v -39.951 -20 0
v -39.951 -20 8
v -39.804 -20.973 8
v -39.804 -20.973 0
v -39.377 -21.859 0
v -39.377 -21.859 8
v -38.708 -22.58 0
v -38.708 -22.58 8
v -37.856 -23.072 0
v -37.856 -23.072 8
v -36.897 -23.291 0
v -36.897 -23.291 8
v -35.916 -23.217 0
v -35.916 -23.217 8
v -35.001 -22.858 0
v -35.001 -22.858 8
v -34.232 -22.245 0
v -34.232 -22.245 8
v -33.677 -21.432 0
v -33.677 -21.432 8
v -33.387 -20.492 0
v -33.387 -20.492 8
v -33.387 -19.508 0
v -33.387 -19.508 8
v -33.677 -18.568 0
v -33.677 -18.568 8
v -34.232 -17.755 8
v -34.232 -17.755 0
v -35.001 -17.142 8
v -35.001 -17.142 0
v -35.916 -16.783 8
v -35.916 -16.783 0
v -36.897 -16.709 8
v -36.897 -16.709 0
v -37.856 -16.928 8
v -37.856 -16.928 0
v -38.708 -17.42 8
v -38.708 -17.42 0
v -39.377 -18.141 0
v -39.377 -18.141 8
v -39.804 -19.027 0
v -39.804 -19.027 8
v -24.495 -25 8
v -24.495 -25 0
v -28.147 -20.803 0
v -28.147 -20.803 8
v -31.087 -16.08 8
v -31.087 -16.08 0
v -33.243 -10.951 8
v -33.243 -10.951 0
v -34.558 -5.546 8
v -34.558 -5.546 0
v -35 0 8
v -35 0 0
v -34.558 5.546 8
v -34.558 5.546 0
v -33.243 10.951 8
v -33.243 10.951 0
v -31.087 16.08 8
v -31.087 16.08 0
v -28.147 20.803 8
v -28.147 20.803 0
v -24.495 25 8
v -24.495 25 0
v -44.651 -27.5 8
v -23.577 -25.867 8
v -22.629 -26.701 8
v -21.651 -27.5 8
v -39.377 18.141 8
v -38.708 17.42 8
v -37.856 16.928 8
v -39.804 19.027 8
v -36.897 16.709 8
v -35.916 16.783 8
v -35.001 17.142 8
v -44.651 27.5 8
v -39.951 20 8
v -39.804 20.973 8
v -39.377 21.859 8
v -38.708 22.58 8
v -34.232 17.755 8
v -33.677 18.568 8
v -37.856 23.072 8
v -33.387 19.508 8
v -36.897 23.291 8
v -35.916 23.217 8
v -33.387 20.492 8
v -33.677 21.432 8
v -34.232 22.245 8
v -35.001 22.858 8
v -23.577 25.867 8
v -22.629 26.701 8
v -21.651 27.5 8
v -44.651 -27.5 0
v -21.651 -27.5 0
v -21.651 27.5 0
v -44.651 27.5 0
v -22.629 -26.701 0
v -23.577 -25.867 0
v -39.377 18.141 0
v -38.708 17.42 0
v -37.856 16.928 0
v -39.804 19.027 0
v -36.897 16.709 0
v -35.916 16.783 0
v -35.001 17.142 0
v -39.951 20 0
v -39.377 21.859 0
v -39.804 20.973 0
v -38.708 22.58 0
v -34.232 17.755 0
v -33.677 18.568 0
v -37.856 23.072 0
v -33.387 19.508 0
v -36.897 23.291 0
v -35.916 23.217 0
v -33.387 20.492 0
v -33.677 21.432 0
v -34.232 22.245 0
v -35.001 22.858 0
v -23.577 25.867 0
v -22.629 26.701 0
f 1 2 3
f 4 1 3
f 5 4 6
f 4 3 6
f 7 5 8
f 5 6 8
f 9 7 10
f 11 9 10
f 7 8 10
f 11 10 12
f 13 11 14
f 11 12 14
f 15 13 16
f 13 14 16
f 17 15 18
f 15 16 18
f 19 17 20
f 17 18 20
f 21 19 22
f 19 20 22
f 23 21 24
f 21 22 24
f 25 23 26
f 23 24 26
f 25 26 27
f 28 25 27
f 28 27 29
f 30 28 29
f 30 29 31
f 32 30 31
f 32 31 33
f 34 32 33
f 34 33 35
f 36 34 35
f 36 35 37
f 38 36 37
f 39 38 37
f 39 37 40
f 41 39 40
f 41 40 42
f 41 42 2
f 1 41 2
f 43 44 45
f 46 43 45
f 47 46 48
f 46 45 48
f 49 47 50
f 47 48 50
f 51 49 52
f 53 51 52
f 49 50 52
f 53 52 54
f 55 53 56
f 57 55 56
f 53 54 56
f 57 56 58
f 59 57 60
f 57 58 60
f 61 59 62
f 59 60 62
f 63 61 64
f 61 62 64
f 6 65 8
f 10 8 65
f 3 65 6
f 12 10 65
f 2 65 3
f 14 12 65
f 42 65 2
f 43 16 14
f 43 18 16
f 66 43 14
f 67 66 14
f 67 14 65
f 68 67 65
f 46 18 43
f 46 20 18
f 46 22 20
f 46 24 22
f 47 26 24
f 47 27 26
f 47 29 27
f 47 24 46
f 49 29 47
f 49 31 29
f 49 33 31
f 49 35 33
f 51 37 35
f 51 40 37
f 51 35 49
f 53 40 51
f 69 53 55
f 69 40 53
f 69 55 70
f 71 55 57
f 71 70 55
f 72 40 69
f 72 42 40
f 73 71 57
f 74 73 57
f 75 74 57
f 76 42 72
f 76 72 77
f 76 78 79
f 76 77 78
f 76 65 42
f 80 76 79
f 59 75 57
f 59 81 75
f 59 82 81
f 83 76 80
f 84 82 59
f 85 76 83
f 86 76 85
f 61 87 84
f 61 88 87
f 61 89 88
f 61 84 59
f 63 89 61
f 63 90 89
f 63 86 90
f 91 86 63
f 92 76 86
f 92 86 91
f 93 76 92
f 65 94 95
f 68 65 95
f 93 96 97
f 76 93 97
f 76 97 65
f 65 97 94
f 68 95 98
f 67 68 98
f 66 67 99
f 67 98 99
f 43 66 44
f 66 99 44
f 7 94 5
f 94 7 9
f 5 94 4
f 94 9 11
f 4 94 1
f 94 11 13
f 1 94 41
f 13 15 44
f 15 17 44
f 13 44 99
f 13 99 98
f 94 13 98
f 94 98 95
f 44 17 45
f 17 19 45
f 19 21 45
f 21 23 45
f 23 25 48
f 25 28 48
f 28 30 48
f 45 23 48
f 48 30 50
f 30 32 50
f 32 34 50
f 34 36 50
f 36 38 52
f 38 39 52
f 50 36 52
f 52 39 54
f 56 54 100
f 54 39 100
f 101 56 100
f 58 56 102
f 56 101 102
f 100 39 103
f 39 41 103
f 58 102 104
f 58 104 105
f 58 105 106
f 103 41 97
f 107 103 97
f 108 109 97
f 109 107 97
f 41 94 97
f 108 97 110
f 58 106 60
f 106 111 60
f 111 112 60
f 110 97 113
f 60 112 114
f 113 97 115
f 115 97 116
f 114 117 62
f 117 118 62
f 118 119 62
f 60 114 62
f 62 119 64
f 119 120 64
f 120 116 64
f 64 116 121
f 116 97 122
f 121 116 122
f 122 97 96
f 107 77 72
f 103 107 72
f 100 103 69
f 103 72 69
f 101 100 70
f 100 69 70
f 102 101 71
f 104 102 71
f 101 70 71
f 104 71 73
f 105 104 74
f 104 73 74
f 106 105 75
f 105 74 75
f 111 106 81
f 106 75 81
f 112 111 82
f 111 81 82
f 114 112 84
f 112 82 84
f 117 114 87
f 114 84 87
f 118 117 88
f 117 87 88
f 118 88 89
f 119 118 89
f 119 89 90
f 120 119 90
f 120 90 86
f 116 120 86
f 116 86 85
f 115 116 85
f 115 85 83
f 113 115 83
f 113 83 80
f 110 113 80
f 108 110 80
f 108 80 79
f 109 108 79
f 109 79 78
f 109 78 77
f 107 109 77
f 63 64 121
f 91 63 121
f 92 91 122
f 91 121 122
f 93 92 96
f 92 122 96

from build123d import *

# Parameters (mm, degrees)
F1_DEPTH = 8
F3_D     = 6.6


with BuildPart() as f1:
    # F0 (on Top) → F1 (new body)
    with BuildSketch(Plane.XY):
        with BuildLine():
            ThreePointArc((-24.494897, -25), (-35, 0), (-24.494897, 25))
            ThreePointArc((-24.494897, 25), (-23.106602, 26.288495), (-21.650635, 27.5))
            Line((-21.650635, 27.5), (-44.650635, 27.5))
            Line((-44.650635, 27.5), (-44.650635, -27.5))
            Line((-44.650635, -27.5), (-21.650635, -27.5))
            ThreePointArc((-21.650635, -27.5), (-23.106602, -26.288495), (-24.494897, -25))
        make_face()
    extrude(amount=F1_DEPTH)

    # F3 (through all)
    with Locations(Plane(origin=(0, 0, 0), x_dir=(1, 0, 0), z_dir=(0, 0, -1))):
        with Locations((-36.650635, 20), (-36.650635, -20)):
            Hole(F3_D / 2)


solid = f1.part
